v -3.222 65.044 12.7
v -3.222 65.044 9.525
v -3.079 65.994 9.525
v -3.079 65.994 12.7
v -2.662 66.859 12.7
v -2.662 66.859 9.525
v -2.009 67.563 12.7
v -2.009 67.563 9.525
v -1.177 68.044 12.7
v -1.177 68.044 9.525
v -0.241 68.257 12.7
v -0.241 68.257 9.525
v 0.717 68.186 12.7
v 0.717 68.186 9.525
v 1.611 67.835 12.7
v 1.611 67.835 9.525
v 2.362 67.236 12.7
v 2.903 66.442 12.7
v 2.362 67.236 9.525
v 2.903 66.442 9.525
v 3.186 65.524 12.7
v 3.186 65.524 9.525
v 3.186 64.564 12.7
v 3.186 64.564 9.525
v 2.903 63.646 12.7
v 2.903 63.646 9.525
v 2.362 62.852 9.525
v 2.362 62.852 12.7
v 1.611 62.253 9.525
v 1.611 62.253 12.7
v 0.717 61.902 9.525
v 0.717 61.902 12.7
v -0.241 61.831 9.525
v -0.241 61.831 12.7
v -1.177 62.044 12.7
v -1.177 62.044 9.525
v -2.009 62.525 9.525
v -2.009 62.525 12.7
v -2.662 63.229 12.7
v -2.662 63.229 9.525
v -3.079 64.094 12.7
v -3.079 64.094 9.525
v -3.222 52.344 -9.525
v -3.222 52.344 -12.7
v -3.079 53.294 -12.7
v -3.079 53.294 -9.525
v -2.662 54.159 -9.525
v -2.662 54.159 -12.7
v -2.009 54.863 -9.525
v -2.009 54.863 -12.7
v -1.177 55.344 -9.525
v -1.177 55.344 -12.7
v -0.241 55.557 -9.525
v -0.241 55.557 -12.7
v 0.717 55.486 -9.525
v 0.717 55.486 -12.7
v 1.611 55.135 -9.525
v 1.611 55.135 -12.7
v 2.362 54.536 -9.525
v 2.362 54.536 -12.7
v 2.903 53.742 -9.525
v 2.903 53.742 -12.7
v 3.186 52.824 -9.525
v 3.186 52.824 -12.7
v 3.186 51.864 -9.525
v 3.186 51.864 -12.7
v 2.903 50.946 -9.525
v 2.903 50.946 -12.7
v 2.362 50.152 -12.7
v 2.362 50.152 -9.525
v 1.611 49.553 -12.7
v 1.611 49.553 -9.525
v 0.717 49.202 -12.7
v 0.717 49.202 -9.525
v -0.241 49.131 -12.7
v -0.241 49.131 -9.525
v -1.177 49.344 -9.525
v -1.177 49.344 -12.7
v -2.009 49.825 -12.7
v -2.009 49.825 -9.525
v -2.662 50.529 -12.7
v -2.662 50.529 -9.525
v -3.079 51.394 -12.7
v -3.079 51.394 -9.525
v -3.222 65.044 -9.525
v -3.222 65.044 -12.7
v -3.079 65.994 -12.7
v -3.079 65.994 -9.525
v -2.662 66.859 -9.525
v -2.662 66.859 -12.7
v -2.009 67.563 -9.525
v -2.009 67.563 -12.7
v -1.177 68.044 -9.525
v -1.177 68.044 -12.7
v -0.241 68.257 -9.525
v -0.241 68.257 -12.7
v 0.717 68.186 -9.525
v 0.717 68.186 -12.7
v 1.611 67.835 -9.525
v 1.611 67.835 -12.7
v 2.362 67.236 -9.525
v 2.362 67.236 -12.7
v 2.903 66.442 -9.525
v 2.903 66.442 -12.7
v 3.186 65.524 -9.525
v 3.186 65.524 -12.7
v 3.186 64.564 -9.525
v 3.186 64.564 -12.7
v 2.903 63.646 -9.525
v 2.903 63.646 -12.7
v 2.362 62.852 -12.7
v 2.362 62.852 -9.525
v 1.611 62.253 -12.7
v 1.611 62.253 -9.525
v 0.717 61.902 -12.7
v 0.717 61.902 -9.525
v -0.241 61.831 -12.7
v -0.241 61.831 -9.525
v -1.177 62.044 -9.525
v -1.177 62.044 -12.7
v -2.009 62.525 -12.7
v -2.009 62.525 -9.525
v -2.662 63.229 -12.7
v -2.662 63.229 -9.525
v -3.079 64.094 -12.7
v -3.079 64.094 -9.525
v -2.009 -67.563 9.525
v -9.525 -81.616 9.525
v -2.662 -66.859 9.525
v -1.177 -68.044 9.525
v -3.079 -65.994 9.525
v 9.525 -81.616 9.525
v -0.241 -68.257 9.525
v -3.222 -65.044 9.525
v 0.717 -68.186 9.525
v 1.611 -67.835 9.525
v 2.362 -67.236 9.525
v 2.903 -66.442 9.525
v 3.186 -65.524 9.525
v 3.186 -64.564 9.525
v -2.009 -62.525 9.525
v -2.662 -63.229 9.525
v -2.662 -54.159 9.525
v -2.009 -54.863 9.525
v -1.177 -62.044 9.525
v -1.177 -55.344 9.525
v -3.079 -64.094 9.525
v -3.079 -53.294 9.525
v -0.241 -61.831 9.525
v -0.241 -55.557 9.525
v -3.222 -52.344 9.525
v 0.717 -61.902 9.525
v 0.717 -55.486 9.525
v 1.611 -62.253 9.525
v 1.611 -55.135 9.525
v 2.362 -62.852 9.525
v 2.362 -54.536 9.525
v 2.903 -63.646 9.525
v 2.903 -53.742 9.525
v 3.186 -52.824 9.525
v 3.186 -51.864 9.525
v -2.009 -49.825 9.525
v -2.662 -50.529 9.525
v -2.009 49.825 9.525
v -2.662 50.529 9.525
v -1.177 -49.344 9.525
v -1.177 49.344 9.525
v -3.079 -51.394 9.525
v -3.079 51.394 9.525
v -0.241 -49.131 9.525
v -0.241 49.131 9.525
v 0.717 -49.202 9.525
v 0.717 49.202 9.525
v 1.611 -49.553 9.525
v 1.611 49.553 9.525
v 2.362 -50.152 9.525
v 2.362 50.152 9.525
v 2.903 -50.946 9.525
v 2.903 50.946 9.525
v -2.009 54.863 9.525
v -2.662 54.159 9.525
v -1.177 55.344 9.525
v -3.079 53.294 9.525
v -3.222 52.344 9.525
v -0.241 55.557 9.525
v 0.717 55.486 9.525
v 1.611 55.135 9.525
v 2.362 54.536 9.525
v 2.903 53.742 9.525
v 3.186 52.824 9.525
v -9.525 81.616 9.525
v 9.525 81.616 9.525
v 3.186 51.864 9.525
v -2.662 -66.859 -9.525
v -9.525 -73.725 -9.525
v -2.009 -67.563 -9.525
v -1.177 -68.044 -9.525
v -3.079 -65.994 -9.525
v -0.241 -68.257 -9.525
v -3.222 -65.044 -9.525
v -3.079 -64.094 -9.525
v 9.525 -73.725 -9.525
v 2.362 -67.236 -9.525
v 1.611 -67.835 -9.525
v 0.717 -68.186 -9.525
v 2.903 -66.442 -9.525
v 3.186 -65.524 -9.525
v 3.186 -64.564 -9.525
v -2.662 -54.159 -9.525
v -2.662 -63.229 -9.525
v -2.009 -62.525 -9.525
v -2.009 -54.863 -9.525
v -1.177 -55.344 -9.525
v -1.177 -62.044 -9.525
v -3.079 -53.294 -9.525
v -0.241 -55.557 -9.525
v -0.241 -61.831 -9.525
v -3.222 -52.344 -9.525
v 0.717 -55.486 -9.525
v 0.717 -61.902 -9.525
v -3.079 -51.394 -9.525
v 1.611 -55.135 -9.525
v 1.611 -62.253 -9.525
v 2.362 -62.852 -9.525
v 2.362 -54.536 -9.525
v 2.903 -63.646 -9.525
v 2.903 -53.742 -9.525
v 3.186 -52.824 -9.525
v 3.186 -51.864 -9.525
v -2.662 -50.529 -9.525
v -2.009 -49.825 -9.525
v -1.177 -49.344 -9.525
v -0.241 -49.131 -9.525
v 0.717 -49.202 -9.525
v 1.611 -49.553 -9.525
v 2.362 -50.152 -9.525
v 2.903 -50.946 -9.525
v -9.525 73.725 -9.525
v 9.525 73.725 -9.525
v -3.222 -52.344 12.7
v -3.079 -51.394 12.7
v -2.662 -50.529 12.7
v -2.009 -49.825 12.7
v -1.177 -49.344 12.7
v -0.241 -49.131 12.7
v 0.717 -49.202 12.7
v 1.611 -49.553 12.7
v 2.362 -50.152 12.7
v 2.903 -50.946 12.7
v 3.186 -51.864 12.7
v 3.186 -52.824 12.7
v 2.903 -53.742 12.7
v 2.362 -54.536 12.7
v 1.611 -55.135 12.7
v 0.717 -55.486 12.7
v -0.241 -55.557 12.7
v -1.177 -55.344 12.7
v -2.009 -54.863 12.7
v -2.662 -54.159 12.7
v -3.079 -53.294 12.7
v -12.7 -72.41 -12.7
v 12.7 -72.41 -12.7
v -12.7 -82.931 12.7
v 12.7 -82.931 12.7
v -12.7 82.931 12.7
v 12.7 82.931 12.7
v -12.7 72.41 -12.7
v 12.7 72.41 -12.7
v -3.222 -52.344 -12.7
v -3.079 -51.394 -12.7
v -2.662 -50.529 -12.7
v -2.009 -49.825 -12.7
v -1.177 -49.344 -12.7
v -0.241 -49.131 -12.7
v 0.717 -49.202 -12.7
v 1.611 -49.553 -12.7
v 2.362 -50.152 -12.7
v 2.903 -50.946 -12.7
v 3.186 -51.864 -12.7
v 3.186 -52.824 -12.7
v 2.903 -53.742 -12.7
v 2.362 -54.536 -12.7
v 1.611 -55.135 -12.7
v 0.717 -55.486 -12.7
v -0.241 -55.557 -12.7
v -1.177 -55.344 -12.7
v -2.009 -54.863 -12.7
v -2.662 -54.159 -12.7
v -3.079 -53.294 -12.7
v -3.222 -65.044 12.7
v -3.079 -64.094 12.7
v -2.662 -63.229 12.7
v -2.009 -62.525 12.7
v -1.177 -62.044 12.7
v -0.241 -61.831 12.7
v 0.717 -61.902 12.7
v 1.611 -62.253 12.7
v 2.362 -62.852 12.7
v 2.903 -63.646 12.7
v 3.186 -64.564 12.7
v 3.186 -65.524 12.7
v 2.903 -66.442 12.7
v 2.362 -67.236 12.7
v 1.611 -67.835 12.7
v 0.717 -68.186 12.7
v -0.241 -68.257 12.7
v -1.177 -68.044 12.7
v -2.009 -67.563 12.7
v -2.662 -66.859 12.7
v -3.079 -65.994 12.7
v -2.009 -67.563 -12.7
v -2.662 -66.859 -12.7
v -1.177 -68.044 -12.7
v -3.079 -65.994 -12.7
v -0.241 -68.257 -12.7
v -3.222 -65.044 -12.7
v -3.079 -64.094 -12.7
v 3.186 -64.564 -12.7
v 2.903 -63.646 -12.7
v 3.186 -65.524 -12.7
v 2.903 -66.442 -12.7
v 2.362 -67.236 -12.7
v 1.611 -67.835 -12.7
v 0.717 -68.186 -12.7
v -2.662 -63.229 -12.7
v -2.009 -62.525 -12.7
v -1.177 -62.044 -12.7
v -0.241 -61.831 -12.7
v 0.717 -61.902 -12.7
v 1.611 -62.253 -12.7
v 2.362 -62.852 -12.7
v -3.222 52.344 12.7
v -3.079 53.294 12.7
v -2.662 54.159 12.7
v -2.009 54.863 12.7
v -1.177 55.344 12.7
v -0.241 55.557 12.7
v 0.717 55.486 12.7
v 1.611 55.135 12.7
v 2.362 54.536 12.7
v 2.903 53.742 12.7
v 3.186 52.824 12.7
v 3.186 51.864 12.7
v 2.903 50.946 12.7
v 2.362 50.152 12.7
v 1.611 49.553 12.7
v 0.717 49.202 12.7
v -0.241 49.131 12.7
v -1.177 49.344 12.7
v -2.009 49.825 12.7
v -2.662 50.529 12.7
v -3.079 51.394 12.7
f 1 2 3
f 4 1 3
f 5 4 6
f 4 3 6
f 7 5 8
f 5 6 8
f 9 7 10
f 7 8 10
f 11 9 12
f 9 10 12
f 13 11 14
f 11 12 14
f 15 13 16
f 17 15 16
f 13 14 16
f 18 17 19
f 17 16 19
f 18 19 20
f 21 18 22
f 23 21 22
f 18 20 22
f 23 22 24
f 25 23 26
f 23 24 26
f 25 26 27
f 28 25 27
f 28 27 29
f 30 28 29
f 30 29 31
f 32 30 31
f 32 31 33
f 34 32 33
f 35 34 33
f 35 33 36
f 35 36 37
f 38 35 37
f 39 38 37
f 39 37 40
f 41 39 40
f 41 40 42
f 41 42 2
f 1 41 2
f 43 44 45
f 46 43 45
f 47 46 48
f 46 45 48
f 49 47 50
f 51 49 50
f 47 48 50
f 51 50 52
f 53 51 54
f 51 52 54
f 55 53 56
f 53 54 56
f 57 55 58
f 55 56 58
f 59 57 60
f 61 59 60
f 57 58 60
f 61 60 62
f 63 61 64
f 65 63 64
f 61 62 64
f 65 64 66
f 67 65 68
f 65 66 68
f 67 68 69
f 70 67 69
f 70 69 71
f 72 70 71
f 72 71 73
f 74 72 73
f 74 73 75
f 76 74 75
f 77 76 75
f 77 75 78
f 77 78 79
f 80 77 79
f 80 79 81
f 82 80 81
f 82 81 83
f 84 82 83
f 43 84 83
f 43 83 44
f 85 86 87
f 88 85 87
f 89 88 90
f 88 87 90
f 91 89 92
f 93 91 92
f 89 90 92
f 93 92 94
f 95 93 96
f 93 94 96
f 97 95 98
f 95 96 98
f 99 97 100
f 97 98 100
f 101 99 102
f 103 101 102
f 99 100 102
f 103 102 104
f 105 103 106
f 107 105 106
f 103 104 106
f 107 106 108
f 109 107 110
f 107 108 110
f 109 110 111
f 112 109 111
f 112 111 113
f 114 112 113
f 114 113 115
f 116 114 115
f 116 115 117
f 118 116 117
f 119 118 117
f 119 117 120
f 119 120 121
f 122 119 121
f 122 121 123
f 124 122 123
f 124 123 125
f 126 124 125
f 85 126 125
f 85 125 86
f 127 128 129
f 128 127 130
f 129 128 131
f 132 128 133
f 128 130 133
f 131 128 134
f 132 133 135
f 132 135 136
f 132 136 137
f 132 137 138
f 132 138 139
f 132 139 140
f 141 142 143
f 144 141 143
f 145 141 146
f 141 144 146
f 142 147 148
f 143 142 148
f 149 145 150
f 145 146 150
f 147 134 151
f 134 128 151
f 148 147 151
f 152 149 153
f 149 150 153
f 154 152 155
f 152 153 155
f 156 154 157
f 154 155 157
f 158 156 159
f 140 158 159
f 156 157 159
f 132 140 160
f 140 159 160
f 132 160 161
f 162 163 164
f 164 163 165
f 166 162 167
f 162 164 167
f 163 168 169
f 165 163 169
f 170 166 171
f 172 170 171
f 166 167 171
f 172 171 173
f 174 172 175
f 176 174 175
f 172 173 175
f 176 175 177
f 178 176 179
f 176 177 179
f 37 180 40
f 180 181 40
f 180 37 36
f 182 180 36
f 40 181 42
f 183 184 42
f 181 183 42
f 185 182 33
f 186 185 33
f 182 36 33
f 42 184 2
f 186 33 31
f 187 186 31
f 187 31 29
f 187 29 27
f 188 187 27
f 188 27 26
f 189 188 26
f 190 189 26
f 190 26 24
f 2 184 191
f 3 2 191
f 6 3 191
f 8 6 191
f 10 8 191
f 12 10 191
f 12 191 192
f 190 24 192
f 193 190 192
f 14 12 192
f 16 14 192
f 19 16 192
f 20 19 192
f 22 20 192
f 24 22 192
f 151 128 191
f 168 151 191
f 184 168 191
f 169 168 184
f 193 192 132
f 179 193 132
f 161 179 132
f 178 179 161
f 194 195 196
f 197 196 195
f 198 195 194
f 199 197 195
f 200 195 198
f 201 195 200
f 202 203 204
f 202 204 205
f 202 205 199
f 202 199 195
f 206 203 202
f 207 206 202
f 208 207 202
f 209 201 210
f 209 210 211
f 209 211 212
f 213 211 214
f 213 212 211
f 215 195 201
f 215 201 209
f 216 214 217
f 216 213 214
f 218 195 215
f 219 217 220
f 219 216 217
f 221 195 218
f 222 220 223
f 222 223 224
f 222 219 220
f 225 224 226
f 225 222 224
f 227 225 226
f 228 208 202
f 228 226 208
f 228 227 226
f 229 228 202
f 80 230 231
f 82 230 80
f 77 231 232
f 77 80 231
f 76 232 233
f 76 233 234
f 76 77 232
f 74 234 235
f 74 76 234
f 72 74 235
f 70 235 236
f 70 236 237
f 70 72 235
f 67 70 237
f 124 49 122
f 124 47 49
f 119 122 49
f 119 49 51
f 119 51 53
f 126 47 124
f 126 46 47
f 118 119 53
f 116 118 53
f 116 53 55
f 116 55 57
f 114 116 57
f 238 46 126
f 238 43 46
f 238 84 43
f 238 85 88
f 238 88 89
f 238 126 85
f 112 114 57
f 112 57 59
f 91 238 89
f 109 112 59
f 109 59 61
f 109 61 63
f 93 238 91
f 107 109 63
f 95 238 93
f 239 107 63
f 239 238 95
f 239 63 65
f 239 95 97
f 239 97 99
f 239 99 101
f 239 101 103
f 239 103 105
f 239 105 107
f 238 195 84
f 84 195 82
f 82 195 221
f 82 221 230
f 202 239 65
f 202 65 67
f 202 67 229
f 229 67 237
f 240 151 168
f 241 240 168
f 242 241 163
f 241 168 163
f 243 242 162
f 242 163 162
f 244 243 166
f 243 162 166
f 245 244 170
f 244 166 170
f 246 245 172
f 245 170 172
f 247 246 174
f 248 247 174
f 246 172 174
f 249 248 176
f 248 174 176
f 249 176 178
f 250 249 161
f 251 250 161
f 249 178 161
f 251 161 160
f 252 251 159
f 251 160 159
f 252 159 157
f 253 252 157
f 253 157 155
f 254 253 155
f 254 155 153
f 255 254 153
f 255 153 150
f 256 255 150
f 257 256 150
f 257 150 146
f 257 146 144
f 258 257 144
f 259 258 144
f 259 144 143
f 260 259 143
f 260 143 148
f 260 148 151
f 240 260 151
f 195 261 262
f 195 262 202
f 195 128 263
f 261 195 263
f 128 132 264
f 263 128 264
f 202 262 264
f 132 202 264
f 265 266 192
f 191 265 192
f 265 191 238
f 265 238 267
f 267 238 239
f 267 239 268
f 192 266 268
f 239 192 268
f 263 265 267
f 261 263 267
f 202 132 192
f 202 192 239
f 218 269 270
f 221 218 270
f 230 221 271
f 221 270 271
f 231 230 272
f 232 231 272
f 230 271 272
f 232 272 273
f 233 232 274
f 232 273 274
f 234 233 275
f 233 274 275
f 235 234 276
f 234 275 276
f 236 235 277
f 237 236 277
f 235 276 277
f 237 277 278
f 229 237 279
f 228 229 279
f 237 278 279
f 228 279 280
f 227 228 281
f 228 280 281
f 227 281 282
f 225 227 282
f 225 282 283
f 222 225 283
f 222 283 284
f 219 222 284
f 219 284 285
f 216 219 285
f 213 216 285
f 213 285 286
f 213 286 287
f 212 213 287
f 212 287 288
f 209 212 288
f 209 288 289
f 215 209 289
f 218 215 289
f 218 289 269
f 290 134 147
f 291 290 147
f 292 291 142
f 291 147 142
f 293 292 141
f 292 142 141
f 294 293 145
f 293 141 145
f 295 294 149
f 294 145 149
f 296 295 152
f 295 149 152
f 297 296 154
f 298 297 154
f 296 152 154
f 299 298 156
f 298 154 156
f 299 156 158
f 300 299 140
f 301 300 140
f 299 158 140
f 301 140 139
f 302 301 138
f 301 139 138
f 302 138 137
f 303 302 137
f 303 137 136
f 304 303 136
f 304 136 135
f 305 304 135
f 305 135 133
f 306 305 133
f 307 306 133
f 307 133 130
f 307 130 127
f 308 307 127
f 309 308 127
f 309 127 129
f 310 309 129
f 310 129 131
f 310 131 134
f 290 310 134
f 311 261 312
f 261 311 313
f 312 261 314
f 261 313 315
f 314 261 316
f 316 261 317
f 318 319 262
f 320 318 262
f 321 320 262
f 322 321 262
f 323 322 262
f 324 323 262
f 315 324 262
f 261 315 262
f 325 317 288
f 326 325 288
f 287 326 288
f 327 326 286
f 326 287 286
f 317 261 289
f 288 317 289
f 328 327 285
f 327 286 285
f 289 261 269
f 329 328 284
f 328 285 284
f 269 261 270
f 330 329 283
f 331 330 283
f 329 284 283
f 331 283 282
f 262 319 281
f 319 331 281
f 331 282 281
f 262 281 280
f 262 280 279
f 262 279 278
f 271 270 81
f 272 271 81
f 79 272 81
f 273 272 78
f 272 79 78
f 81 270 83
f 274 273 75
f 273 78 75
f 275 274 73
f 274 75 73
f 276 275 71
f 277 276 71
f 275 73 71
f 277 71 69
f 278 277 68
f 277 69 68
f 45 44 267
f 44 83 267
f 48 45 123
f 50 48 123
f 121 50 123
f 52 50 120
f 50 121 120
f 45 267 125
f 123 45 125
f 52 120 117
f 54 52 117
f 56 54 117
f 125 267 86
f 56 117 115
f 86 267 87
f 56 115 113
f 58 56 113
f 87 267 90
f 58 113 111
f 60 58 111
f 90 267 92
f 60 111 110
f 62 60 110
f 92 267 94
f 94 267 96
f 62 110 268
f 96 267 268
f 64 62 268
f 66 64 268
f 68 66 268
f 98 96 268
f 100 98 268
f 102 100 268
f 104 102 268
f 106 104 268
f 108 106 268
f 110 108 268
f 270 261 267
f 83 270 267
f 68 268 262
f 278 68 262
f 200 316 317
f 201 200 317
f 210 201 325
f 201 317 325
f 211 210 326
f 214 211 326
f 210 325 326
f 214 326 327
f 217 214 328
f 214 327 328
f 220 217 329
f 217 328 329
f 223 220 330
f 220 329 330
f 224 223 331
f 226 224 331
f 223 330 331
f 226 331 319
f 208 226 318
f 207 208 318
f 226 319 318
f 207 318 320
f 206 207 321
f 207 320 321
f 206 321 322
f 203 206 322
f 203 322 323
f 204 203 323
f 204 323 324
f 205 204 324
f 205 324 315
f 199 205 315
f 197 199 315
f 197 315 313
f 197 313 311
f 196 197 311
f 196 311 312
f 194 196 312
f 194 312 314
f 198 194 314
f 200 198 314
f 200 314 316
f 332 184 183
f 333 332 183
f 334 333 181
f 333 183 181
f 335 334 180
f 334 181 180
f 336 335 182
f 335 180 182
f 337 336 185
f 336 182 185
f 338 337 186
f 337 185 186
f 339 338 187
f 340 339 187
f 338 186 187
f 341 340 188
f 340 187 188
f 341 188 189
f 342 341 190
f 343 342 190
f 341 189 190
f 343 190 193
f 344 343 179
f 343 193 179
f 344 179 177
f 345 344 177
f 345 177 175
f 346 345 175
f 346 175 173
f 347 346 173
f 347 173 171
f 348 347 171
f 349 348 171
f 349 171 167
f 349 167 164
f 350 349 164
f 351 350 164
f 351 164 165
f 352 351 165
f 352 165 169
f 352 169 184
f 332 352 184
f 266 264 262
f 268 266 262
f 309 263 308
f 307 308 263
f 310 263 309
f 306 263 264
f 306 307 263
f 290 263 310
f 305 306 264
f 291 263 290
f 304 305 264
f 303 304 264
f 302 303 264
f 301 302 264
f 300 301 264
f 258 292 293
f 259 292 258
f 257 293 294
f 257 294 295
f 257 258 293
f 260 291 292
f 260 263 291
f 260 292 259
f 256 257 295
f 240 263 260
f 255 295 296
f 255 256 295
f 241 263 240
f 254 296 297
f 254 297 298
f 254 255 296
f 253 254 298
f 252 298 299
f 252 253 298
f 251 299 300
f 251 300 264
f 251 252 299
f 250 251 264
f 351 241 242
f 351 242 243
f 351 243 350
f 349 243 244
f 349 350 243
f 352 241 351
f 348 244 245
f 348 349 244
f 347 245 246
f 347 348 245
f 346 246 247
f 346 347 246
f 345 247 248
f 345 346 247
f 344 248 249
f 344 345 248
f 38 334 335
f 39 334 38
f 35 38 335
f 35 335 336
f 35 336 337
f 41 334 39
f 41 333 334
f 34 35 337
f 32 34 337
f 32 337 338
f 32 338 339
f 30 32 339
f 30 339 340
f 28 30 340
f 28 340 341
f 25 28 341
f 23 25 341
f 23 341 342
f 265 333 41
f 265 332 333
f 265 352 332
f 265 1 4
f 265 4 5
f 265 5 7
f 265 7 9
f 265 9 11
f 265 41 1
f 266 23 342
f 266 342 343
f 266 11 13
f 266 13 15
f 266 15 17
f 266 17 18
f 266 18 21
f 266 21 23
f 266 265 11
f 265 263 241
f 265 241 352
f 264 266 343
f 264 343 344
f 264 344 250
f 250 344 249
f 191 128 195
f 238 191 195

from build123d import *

# Parameters (mm, degrees)
SKETCH1_W           = 25.4
SKETCH1_H           = 25.4
SKETCH1_W_2         = 19.05
SKETCH1_H_2         = 19.05
BOSS_EXTRUDE1_DEPTH = 82.931
CUT_EXTRUDE1_DEPTH  = 88.658432344
SKETCH3_R           = 3.22238806
CUT_EXTRUDE2_DEPTH  = 88.658432344


with BuildPart() as part:
    # Sketch1 → Boss-Extrude1 (new, symmetric)
    with BuildSketch(Plane(origin=(0, 0, 0), x_dir=(1, 0, 0), z_dir=(0, 1, 0))):
        Rectangle(SKETCH1_W, SKETCH1_H)
        Rectangle(SKETCH1_W_2, SKETCH1_H_2, mode=Mode.SUBTRACT)
    extrude(amount=BOSS_EXTRUDE1_DEPTH, both=True)

    # Sketch2 → Cut-Extrude1 (cut, through all)
    with BuildSketch(Plane(origin=(12.7, 0, 0), x_dir=(0, 0, -1), z_dir=(1, 0, 0))):
        Polygon((12.7, 82.931), (-12.7, 82.931), (12.7, 72.409975516), align=None)
        Polygon((12.7, -72.409975516), (-12.7, -82.931), (12.7, -82.931), align=None)
    extrude(amount=-CUT_EXTRUDE1_DEPTH, mode=Mode.SUBTRACT)

    # Sketch3 → Cut-Extrude2 (cut, through all)
    with BuildSketch(Plane(origin=(0, 0, -12.7), x_dir=(-1, 0, 0), z_dir=(0, 0, -1))):
        with Locations((0, -65.043975516)):
            Circle(SKETCH3_R)
        with Locations((0, -52.343975516)):
            Circle(SKETCH3_R)
        with Locations((0, 65.043975516)):
            Circle(SKETCH3_R)
        with Locations((0, 52.343975516)):
            Circle(SKETCH3_R)
    extrude(amount=-CUT_EXTRUDE2_DEPTH, mode=Mode.SUBTRACT)


solid = part.part
